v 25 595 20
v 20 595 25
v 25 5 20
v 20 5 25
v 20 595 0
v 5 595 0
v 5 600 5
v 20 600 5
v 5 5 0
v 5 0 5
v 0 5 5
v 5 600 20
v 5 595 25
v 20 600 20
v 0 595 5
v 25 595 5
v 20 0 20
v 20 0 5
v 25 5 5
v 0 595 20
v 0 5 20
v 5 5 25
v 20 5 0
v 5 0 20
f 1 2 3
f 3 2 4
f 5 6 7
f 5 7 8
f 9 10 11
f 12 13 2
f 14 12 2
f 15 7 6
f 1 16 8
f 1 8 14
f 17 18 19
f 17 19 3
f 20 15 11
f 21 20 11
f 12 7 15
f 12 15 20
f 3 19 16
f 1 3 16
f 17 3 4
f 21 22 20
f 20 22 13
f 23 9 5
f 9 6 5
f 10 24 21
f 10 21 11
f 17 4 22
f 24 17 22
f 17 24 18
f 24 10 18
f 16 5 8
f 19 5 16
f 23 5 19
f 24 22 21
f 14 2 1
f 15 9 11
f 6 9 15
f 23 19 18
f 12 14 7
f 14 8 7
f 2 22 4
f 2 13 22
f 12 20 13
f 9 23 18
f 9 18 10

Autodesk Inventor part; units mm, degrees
ref_plane "YZ Plane" through (0, 0, 0) normal (1, 0, 0) x (0, 1, 0)
ref_plane "XZ Plane" through (0, 0, 0) normal (0, 1, 0) x (-1, 0, 0)
ref_plane "XY Plane" through (0, 0, 0) normal (0, 0, 1) x (1, 0, 0)
sketch "Sketch1" plane through (0, 0, 0) normal (0, 0, 1) x (1, 0, 0)
  line L0 (0, 0) -> (25, 0)
  line L1 (25, 0) -> (25, 600)
  line L2 (25, 600) -> (0, 600)
  line L3 (0, 600) -> (0, 0)
  dimension "d0" = 25
  dimension "d1" = 600
extrude "Extrusion1" add sketch "Sketch1" along normal blind 25
chamfer "Chamfer1" distance 5 angle 45 12 edges at (25, 300, 25) (25, 300, 0) (0, 300, 25) (0, 600, 12.5) (12.5, 600, 0) (12.5, 600, 25) (25, 600, 12.5) (25, 0, 12.5) (12.5, 0, 25) (12.5, 0, 0) (0, 0, 12.5) (0, 300, 0)
properties part number "frame"
